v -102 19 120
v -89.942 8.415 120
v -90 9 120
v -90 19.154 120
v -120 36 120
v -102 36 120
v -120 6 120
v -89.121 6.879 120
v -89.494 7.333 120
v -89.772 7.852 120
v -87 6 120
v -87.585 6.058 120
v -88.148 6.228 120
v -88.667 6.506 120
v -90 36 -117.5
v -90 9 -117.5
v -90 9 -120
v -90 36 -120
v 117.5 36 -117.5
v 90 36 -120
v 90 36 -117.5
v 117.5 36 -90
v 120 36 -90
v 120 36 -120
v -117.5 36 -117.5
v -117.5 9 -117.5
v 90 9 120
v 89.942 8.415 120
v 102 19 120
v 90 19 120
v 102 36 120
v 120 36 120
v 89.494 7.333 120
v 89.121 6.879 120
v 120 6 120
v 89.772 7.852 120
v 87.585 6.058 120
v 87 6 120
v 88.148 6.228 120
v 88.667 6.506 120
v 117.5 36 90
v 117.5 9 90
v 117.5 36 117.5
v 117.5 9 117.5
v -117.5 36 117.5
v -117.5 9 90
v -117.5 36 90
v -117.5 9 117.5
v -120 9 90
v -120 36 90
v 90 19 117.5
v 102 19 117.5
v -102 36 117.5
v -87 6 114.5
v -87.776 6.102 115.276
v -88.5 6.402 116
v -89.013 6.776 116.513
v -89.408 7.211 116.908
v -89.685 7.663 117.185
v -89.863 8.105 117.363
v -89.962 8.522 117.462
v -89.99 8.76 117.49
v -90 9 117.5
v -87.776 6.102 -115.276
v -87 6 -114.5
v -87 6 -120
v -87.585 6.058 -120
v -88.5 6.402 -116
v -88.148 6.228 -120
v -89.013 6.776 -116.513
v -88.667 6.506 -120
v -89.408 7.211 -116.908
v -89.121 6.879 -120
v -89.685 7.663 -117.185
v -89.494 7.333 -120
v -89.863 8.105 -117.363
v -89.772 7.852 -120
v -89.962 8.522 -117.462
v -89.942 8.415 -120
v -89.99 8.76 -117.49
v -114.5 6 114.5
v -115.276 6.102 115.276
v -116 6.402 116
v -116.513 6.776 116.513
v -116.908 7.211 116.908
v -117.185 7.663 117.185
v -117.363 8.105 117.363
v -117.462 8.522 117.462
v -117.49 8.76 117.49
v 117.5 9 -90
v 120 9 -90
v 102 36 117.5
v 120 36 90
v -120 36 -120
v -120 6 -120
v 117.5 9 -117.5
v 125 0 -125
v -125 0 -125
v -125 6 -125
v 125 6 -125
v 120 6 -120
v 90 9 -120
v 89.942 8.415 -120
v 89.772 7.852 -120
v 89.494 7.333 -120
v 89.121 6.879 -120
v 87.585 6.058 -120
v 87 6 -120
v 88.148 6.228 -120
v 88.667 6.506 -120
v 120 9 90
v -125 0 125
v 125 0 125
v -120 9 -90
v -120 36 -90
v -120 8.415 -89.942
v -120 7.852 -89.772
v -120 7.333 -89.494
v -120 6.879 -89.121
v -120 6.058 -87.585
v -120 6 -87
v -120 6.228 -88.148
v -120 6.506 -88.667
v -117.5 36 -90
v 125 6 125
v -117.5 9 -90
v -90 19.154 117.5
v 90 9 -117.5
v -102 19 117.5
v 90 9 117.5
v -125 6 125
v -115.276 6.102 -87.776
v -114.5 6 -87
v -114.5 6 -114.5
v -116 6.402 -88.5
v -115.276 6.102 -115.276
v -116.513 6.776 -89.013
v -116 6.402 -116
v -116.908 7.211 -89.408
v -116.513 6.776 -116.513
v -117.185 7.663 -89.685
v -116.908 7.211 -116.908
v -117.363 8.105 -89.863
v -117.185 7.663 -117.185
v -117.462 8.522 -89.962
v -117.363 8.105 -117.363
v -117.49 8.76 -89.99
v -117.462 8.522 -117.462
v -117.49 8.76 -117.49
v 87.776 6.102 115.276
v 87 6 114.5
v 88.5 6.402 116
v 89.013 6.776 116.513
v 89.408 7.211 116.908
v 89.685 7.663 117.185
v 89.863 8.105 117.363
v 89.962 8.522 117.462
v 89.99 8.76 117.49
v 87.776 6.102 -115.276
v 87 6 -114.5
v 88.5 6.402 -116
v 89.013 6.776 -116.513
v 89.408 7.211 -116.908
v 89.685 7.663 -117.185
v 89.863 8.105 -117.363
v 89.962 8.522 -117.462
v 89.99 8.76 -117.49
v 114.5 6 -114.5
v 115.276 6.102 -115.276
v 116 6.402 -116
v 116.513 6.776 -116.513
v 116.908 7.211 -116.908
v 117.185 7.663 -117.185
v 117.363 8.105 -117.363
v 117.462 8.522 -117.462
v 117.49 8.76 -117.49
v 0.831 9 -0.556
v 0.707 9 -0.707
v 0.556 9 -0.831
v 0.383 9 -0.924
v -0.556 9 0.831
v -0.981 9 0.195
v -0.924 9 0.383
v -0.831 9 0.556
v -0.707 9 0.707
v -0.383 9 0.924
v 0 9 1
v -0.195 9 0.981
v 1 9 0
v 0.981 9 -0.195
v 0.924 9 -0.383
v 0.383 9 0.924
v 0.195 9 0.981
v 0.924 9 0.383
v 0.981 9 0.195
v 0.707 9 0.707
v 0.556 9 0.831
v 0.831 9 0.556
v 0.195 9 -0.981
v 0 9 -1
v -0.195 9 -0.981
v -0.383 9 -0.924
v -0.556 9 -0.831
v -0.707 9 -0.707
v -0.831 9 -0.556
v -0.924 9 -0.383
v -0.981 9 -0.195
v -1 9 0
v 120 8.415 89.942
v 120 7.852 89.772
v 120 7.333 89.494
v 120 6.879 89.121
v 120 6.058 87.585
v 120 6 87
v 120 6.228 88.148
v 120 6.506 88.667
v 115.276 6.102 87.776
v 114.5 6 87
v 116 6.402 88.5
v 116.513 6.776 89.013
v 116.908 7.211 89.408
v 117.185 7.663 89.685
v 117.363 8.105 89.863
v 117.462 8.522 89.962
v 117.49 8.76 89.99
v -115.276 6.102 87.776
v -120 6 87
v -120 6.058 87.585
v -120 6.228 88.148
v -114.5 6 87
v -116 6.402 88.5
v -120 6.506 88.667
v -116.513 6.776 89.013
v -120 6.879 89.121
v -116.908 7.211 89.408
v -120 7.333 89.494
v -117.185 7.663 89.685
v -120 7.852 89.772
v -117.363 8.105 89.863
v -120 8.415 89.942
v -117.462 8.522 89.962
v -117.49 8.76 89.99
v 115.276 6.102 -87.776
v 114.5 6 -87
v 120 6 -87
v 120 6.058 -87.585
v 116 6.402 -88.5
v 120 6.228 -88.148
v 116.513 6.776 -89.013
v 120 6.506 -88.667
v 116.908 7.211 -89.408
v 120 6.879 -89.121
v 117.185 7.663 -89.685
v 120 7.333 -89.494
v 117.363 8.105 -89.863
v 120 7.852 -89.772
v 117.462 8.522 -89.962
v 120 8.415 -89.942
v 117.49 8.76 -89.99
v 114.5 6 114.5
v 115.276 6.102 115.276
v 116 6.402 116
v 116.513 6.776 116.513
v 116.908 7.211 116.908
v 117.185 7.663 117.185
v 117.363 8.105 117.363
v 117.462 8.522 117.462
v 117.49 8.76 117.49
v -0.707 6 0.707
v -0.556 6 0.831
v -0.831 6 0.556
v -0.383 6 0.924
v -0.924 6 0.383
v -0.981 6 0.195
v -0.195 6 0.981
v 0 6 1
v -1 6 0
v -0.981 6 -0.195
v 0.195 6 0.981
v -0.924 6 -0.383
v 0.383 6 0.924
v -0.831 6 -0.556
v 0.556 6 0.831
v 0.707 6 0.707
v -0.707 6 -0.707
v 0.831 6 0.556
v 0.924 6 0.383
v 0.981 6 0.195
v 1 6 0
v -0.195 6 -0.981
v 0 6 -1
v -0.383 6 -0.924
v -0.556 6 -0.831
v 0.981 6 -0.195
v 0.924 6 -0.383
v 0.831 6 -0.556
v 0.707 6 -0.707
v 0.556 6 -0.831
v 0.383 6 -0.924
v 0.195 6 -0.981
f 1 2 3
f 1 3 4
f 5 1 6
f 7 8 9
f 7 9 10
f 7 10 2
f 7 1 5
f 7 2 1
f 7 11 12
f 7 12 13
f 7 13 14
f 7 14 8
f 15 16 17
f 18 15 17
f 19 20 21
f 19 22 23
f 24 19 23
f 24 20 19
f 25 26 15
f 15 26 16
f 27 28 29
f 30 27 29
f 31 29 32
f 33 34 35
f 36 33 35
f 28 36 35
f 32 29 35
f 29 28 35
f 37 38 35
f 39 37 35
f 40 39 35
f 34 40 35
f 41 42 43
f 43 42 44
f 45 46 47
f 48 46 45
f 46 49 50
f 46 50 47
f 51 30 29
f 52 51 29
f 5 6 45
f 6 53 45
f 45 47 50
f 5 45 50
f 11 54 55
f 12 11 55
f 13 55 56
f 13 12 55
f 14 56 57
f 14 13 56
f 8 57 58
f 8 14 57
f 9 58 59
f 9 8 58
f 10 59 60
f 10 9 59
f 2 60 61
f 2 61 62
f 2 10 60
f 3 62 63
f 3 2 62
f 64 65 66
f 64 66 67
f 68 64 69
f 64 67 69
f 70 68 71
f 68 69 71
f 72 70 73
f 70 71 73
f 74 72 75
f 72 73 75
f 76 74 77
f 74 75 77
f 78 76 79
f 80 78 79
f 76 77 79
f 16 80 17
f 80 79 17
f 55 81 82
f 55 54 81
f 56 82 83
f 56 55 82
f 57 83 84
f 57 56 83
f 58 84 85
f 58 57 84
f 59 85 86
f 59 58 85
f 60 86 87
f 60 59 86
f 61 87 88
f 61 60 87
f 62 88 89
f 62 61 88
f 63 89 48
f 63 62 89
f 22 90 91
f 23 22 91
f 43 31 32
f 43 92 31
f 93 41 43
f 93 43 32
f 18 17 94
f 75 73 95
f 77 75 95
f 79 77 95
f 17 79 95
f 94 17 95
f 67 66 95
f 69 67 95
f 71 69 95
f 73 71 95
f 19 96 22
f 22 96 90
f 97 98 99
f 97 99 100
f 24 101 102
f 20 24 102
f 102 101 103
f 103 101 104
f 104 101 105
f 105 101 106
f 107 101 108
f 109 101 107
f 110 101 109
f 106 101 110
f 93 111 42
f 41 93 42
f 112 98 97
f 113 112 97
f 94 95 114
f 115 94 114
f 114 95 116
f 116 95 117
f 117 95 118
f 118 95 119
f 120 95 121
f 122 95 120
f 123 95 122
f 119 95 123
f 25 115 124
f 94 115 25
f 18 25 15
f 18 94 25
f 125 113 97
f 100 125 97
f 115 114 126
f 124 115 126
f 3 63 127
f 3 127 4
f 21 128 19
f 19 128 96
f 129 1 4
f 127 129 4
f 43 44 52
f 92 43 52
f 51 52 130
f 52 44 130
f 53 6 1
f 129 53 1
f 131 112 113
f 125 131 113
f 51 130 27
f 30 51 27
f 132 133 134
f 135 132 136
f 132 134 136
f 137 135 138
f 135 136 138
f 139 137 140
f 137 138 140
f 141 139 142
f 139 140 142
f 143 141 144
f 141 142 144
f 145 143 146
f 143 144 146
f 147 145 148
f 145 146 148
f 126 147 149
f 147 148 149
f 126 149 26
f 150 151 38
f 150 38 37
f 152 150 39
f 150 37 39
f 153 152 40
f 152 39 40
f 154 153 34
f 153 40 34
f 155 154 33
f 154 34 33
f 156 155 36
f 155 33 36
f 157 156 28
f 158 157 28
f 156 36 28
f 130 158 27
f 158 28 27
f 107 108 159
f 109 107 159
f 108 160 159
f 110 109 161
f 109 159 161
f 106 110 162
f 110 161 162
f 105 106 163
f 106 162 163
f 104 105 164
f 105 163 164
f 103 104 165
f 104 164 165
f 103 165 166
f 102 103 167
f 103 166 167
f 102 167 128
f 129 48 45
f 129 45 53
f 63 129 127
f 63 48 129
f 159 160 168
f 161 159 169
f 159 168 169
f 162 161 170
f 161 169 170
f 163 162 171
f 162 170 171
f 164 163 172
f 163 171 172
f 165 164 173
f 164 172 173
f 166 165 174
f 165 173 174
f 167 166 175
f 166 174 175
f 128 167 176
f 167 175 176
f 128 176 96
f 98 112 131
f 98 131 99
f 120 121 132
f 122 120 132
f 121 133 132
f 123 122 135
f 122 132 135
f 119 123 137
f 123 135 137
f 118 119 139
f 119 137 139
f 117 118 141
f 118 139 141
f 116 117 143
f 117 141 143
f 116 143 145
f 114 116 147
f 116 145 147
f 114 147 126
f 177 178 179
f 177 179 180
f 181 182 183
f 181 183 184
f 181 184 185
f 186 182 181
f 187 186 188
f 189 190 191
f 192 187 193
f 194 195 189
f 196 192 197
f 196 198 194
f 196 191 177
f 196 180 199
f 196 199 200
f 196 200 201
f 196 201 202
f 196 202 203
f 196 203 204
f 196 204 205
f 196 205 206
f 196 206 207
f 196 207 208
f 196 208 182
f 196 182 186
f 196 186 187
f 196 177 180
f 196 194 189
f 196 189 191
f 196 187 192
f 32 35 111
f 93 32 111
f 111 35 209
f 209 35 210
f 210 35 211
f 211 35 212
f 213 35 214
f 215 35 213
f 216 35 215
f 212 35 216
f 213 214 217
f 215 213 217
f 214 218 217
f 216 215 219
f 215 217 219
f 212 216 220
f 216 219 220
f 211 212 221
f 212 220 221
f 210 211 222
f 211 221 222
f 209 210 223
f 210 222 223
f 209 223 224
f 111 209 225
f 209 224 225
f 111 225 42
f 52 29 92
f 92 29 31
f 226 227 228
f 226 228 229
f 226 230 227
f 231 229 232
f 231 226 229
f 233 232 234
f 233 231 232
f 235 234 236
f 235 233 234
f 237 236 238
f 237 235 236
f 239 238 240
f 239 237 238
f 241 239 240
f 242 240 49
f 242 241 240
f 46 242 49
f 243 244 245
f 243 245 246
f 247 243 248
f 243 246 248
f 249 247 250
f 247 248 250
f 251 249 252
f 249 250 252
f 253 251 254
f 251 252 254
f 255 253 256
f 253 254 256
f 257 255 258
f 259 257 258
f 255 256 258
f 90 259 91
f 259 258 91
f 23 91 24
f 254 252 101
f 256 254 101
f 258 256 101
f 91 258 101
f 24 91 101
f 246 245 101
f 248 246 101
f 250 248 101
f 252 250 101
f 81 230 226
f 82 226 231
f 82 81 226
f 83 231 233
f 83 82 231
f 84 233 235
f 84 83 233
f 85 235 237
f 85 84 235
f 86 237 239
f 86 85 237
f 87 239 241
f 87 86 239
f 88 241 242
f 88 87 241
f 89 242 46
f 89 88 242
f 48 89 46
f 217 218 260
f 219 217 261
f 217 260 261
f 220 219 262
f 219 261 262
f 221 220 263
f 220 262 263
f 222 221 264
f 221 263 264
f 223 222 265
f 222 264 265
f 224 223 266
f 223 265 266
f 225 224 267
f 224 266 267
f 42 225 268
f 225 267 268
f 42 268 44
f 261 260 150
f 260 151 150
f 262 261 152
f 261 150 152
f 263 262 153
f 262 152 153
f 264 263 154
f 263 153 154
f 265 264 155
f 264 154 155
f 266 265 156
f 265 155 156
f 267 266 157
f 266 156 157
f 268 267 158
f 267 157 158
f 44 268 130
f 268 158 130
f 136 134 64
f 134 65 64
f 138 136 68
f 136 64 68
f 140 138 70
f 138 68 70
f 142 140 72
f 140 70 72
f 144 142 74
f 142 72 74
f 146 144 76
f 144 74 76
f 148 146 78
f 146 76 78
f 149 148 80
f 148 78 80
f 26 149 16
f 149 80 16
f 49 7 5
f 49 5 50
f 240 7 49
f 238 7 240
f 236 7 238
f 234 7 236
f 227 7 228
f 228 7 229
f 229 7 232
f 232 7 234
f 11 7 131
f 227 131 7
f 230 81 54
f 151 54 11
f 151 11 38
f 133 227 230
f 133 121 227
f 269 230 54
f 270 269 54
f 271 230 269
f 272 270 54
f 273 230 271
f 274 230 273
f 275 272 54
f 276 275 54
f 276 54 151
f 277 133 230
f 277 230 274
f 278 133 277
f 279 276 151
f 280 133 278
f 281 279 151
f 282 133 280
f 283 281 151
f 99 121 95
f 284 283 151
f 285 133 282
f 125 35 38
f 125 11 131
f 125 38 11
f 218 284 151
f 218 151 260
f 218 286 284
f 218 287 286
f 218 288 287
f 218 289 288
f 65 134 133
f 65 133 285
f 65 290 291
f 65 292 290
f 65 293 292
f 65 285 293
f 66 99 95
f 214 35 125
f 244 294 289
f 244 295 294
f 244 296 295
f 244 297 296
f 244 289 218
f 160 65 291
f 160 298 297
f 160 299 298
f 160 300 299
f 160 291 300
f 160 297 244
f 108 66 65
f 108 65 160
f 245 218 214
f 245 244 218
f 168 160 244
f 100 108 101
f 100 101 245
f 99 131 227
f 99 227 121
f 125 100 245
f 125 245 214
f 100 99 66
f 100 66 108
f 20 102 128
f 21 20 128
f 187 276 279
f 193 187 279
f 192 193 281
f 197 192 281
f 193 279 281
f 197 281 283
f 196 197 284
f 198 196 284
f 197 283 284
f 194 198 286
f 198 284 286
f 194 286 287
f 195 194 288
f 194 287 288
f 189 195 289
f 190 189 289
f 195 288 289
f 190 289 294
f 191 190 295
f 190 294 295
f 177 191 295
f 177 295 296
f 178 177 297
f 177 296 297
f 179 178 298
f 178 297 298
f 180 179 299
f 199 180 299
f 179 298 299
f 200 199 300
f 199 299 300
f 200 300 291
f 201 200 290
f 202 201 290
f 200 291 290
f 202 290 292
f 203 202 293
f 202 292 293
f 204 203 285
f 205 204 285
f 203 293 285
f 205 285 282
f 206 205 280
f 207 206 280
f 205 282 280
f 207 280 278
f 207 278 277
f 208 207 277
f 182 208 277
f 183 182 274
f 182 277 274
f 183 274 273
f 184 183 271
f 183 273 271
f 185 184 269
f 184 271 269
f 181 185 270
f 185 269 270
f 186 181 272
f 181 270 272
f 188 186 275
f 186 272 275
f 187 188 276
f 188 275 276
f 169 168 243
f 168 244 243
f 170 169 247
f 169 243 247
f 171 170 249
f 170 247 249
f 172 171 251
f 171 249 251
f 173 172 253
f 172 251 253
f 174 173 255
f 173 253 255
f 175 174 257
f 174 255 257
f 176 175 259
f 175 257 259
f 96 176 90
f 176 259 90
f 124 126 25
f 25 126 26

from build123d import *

# Parameters (mm, degrees)
CROQUIS1_W              = 250
CROQUIS1_H              = 250
SALIENTE_EXTRUIR1_DEPTH = 6
SALIENTE_EXTRUIR2_DEPTH = 30
REDONDEO1_R             = 3
CORTAR_EXTRUIR1_REACH   = 279.391
CROQUIS3_W              = 12
CROQUIS3_H              = 17
CROQUIS4_R              = 1
SALIENTE_EXTRUIR3_DEPTH = 3


with BuildPart() as part:
    # Croquis1 → Saliente-Extruir1 (new body)
    with BuildSketch(Plane(origin=(0, 0, 0), x_dir=(1, 0, 0), z_dir=(0, 1, 0))):
        Rectangle(CROQUIS1_W, CROQUIS1_H)
    extrude(amount=SALIENTE_EXTRUIR1_DEPTH)

    # Croquis2 → Saliente-Extruir2 (add)
    with BuildSketch(Plane(origin=(0, 6, 0), x_dir=(1, 0, 0), z_dir=(0, 1, 0))):
        Polygon((-120, 120), (-120, 90), (-117.5, 90), (-117.5, 117.5), (-90, 117.5), (-90, 120), align=None)
        Polygon((120, 120), (90, 120), (90, 117.5), (117.5, 117.5), (117.5, 90), (120, 90), align=None)
        Polygon((120, -120), (120, -90), (117.5, -90), (117.5, -117.5), (90, -117.5), (90, -120), align=None)
        Polygon((-120, -120), (-120, -90), (-117.5, -90), (-117.5, -117.5), (-90, -117.5), (-90, -120), align=None)
    extrude(amount=SALIENTE_EXTRUIR2_DEPTH)

    # Redondeo1
    redondeo1_edges = [part.edges().sort_by_distance(p)[0] for p in [
        (-118.75, 6, -90),
        (-117.5, 6, -103.75),
        (-103.75, 6, -117.5),
        (-90, 6, -118.75),
        (90, 6, -118.75),
        (103.75, 6, -117.5),
        (117.5, 6, -103.75),
        (118.75, 6, -90),
        (118.75, 6, 90),
        (117.5, 6, 103.75),
        (103.75, 6, 117.5),
        (90, 6, 118.75),
        (-90, 6, 118.75),
        (-103.75, 6, 117.5),
        (-117.5, 6, 103.75),
        (-118.75, 6, 90),
    ]]
    fillet(redondeo1_edges, radius=REDONDEO1_R)

    # Croquis3 → Cortar-Extruir1 (cut, up to next)
    with BuildSketch(Plane.XY.offset(120), mode=Mode.PRIVATE) as cortar_extruir1_sk1:
        Polygon((-102, 36), (-102, 19), (-90, 19.15390734), (-90, 36), align=None)
    cortar_extruir1_tool1 = extrude(cortar_extruir1_sk1.sketch, amount=-CORTAR_EXTRUIR1_REACH, mode=Mode.PRIVATE) & part.part
    # Croquis3 → Cortar-Extruir1 (cut, up to next)
    with BuildSketch(Plane.XY.offset(120), mode=Mode.PRIVATE) as cortar_extruir1_sk2:
        with Locations((96, 27.5)):
            Rectangle(CROQUIS3_W, CROQUIS3_H)
    cortar_extruir1_tool2 = extrude(cortar_extruir1_sk2.sketch, amount=-CORTAR_EXTRUIR1_REACH, mode=Mode.PRIVATE) & part.part
    add(cortar_extruir1_tool1.solids().sort_by_distance((-96.009095, 27.538419, 120))[0], mode=Mode.SUBTRACT)
    add(cortar_extruir1_tool2.solids().sort_by_distance((96, 27.5, 120))[0], mode=Mode.SUBTRACT)

    # Croquis4 → Saliente-Extruir3 (add)
    with BuildSketch(Plane(origin=(0, 6, 0), x_dir=(1, 0, 0), z_dir=(0, 1, 0))):
        with Locations(Location((0, 0, 0), (0, 0, 270))):
            Circle(CROQUIS4_R)
    extrude(amount=SALIENTE_EXTRUIR3_DEPTH)


solid = part.part
